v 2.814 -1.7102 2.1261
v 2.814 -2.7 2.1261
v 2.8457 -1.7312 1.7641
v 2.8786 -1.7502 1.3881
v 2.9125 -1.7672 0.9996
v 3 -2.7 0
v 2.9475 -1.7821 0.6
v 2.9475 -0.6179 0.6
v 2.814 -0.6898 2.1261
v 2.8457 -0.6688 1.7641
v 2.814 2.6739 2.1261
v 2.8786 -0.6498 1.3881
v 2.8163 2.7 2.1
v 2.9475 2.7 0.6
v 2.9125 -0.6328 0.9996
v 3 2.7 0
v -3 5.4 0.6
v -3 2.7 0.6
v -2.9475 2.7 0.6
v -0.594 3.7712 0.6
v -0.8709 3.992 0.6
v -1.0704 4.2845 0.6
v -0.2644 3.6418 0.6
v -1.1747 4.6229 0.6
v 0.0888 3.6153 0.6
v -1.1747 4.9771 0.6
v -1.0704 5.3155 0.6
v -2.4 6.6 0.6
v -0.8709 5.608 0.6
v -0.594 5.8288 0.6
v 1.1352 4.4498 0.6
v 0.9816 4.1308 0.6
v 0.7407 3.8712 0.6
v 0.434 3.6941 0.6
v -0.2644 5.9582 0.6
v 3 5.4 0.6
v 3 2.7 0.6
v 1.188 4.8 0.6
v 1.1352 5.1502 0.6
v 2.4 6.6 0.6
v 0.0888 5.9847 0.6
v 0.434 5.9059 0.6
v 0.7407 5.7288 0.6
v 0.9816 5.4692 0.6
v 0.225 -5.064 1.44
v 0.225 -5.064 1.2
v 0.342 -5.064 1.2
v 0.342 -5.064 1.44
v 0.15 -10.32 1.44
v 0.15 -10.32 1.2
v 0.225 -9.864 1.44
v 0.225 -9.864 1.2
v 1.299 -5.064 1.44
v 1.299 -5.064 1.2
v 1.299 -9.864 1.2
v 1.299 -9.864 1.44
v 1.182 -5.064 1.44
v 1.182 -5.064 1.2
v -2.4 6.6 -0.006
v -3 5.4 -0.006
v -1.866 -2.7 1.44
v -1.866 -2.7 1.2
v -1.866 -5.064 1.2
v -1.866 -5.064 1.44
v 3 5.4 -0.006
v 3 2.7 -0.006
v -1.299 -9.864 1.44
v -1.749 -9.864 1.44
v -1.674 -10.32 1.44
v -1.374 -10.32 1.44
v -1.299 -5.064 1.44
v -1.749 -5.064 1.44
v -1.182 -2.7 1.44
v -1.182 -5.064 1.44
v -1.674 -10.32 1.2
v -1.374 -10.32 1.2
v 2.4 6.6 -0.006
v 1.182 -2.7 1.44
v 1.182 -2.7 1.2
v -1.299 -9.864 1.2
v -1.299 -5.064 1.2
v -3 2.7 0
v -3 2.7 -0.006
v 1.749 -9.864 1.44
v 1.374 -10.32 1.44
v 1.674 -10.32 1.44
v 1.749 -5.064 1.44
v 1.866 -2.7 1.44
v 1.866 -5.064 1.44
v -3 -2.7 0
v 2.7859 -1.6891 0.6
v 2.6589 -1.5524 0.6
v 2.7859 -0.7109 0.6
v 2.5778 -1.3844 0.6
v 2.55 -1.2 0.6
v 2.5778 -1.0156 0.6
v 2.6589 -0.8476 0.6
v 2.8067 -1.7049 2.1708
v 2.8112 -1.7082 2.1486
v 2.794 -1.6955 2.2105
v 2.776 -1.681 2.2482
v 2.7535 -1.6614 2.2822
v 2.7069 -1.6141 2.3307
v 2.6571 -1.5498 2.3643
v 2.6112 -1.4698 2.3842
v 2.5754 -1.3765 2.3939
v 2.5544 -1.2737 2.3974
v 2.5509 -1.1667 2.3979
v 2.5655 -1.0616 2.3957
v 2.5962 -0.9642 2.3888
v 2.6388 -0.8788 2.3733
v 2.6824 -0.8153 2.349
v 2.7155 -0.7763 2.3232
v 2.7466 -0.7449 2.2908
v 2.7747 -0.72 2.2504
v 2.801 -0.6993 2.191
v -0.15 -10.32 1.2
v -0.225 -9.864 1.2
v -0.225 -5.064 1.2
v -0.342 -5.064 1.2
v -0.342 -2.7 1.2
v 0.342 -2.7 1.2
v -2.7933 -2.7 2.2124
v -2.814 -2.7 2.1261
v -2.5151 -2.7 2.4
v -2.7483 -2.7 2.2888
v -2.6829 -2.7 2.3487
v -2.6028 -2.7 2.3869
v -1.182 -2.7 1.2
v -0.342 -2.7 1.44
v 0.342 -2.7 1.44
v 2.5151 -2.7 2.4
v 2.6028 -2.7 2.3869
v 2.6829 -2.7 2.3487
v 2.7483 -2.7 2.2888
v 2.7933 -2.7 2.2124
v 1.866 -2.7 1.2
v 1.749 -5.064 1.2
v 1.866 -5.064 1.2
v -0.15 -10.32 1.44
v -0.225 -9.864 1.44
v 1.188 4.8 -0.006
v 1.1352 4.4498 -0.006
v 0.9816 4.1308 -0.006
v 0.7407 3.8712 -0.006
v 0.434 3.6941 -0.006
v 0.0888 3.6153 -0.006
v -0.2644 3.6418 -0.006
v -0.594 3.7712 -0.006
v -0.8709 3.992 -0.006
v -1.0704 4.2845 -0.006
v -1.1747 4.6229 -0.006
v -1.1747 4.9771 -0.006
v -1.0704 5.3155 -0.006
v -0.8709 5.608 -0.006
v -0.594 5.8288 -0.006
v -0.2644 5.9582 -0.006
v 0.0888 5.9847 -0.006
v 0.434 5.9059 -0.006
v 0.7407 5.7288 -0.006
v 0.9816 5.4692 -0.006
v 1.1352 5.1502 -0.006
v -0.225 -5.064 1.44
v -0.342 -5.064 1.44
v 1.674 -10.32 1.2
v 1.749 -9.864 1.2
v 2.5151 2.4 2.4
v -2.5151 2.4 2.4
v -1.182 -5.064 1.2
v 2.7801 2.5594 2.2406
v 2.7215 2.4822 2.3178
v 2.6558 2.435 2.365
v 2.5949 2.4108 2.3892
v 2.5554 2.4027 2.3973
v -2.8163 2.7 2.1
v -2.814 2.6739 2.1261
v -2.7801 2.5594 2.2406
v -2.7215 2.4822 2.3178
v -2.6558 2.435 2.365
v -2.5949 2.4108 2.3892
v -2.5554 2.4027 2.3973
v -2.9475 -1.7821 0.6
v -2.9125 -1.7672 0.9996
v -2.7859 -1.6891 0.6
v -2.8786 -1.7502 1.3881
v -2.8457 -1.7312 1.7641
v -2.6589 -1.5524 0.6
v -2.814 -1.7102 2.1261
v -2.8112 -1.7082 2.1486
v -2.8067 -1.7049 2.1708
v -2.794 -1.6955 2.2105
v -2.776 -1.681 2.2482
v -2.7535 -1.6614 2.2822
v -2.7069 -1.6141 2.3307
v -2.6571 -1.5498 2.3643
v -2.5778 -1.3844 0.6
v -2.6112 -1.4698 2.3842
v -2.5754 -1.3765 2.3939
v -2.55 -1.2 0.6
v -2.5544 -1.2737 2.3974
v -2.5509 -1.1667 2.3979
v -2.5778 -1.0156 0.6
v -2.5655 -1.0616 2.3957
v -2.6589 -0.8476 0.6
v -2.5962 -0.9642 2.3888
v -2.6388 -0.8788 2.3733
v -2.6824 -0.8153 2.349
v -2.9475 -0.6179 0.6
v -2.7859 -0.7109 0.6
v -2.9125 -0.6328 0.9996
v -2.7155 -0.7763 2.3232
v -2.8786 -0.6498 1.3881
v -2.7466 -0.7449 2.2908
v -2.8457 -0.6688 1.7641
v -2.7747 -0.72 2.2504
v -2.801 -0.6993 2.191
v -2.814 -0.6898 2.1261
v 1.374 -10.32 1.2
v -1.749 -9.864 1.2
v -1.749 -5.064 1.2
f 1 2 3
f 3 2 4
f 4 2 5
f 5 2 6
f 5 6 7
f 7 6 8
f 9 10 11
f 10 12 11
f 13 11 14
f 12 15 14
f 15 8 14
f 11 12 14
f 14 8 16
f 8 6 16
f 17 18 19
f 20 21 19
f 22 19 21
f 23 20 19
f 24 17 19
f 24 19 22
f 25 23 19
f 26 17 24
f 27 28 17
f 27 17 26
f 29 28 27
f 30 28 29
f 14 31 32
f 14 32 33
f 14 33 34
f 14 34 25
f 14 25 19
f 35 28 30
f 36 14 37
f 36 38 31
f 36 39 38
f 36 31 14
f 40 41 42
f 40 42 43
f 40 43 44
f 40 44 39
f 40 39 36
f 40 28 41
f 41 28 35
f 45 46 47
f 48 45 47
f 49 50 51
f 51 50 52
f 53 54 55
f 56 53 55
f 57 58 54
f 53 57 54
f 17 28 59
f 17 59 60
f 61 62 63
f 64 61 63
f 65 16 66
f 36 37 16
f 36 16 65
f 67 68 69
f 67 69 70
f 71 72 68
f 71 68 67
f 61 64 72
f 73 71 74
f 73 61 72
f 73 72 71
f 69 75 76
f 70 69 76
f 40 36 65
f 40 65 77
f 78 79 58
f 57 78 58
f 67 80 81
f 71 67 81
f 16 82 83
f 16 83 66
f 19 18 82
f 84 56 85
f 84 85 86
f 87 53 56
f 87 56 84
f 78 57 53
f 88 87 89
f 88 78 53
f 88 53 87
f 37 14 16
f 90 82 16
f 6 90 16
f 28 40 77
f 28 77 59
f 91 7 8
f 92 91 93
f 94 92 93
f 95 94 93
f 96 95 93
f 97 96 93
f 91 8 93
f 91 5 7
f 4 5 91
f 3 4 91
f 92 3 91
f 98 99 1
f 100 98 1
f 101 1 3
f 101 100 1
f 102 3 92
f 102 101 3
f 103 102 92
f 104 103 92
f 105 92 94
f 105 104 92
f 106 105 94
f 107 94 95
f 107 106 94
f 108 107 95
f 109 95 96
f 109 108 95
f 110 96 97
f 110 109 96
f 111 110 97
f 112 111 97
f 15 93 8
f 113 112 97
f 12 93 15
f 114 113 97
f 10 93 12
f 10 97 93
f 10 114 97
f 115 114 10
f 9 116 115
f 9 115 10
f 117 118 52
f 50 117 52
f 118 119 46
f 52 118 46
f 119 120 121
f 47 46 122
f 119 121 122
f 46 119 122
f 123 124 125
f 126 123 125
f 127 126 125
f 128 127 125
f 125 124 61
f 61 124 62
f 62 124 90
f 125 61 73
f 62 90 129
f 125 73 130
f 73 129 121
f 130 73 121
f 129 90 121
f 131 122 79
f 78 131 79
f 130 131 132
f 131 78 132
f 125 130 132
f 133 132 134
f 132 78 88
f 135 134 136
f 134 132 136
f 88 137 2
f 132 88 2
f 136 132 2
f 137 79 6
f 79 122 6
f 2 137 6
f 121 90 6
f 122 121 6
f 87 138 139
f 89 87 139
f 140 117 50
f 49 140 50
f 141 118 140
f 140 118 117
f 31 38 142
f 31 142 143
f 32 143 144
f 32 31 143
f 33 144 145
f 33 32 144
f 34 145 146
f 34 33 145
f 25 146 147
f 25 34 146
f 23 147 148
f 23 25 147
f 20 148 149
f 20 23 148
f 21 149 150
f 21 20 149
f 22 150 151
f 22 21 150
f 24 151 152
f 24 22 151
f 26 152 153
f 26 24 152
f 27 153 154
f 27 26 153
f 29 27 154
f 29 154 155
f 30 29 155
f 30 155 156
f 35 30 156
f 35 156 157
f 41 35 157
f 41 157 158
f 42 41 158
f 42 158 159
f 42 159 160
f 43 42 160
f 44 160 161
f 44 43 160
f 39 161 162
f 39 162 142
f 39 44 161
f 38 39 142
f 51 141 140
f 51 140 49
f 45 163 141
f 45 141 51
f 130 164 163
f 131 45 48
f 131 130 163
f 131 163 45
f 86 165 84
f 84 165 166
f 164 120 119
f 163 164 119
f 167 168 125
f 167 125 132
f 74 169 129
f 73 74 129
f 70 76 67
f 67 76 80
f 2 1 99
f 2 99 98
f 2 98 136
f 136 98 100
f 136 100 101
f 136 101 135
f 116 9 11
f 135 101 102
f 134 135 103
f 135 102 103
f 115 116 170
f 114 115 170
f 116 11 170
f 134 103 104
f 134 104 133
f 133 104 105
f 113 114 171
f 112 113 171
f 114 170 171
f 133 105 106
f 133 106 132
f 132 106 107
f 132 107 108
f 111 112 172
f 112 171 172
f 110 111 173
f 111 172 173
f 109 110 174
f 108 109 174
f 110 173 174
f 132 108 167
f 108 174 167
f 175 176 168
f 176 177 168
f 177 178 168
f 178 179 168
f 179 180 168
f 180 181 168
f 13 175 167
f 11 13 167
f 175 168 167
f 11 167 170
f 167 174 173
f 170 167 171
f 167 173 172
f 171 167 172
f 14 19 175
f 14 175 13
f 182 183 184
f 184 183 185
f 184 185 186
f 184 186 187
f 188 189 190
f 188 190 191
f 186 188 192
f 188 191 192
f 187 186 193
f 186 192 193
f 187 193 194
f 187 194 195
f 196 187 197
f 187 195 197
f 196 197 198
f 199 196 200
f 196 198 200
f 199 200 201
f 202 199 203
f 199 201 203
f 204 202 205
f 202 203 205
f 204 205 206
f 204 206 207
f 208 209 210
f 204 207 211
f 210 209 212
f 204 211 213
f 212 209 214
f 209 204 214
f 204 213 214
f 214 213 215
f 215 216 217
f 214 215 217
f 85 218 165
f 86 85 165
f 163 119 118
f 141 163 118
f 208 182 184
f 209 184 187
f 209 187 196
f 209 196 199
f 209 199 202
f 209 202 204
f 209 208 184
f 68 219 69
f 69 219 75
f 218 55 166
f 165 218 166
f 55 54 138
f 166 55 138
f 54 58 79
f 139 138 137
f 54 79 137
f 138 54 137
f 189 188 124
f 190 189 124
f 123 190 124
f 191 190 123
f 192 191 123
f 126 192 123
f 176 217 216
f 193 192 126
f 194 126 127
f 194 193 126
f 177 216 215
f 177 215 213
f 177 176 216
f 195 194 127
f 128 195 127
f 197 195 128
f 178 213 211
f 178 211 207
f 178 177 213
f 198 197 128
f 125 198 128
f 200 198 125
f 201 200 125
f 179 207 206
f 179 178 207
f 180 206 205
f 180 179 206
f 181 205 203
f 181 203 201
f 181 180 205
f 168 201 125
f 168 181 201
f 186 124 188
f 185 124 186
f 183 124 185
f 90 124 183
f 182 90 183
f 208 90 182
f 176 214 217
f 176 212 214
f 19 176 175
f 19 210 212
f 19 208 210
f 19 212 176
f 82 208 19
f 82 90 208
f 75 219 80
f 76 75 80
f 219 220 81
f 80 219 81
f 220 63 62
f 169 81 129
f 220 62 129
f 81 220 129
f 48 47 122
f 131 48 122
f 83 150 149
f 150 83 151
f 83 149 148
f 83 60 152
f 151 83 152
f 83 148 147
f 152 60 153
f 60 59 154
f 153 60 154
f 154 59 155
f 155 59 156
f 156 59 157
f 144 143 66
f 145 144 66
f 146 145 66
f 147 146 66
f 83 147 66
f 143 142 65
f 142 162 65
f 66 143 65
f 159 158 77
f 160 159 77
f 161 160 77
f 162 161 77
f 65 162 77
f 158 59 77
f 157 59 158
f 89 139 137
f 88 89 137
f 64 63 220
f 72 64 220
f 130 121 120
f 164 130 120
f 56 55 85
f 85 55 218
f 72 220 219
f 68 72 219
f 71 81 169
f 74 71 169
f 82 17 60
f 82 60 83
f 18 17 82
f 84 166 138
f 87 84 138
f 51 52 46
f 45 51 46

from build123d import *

# Parameters (mm, degrees)
SKETCH2_W                = 10
SKETCH2_H                = 9
BOSS_EXTRUDE1_DEPTH      = 4
CHAMFER1_SIZE            = 0.5
CUT_EXTRUDE1_DEPTH       = 3
BOSS_EXTRUDE2_DEPTH      = 0.4
LPATTERN1_COUNT          = 2
LPATTERN1_PITCH          = 2.54
LPATTERN2_COUNT          = 2
LPATTERN2_PITCH          = 2.54
DRAFT2_ANGLE             = -5
BOSS_EXTRUDE3_DEPTH      = 0.01
BOSS_EXTRUDE3_DEPTH_BACK = 1
SKETCH8_R                = 1.98
FILLET1_R                = 0.5
SCALE1_SCALE             = 0.6


with BuildPart() as part:
    # Sketch2 → Boss-Extrude1 (new body)
    with BuildSketch(Plane.XY):
        Rectangle(SKETCH2_W, SKETCH2_H)
    extrude(amount=BOSS_EXTRUDE1_DEPTH)

    # Chamfer1
    chamfer1_edges = [part.edges().sort_by_distance(p)[0] for p in [
        (0, 4.5, 4),
    ]]
    chamfer(chamfer1_edges, length=CHAMFER1_SIZE)

    # Sketch6 → Cut-Extrude1 (cut)
    with BuildSketch(Plane.XY.offset(4)):
        with BuildLine():
            Line((5, -1), (5, -3))
            ThreePointArc((5, -3), (4.25, -2), (5, -1))
        make_face()
    cut_extrude1 = extrude(amount=-CUT_EXTRUDE1_DEPTH, mode=Mode.SUBTRACT)

    # Mirror1: Cut-Extrude1 across plane
    add(cut_extrude1.mirror(Plane(origin=(0, 0, 0), x_dir=(0, 0, 1), z_dir=(1, 0, 0))), mode=Mode.SUBTRACT)

    # Sketch7 → Boss-Extrude2 (add)
    with BuildSketch(Plane.XY.offset(2)):
        Polygon((-0.57, -4.5), (-0.57, -8.44), (-0.375, -8.44), (-0.375, -16.44), (-0.25, -17.2), (0.25, -17.2), (0.375, -16.44), (0.375, -8.44), (0.57, -8.44), (0.57, -4.5), align=None)
    boss_extrude2 = extrude(amount=BOSS_EXTRUDE2_DEPTH)

    # LPattern1: Boss-Extrude2 ×2
    with Locations(*[(-i * LPATTERN1_PITCH, 0, 0) for i in range(1, LPATTERN1_COUNT)]):
        add(boss_extrude2)

    # LPattern2: Boss-Extrude2 ×2
    with Locations(*[(i * LPATTERN2_PITCH, 0, 0) for i in range(1, LPATTERN2_COUNT)]):
        add(boss_extrude2)

    # Draft2
    draft2_faces = [part.faces().sort_by_distance(p)[0] for p in [
        (5, 0.383542538, 1.891910739),
        (-5, 0.383542538, 1.891910739),
    ]]
    draft(draft2_faces, Plane(origin=(0, 0, 0), x_dir=(-1, 0, 0), z_dir=(0, 0, -1)), DRAFT2_ANGLE)

    # Sketch8 → Boss-Extrude3 (add, two sides: drawn at the far end of the back side and taken through both)
    with BuildSketch(Plane(origin=(0, 0, 0), x_dir=(-1, 0, 0), z_dir=(0, 0, -1)).offset(-BOSS_EXTRUDE3_DEPTH_BACK)):
        Polygon((-5, 9), (-4, 11), (4, 11), (5, 9), (5, 4.5), (-5, 4.5), align=None)
        with Locations(Location((0, 8, 0), (0, 0, 180))):
            Circle(SKETCH8_R, mode=Mode.SUBTRACT)
    extrude(amount=BOSS_EXTRUDE3_DEPTH + BOSS_EXTRUDE3_DEPTH_BACK)

    # Fillet1
    fillet1_edges = [part.edges().sort_by_distance(p)[0] for p in [
        (-4.650045346, 1.410302183, 4),
        (4.650045346, 1.410302183, 4),
    ]]
    fillet(fillet1_edges, radius=FILLET1_R)


with BuildPart() as part_1:
    # Scale1: scaled about (0, 0, 0)
    add(part.part.scale(SCALE1_SCALE))


solid = part_1.part
